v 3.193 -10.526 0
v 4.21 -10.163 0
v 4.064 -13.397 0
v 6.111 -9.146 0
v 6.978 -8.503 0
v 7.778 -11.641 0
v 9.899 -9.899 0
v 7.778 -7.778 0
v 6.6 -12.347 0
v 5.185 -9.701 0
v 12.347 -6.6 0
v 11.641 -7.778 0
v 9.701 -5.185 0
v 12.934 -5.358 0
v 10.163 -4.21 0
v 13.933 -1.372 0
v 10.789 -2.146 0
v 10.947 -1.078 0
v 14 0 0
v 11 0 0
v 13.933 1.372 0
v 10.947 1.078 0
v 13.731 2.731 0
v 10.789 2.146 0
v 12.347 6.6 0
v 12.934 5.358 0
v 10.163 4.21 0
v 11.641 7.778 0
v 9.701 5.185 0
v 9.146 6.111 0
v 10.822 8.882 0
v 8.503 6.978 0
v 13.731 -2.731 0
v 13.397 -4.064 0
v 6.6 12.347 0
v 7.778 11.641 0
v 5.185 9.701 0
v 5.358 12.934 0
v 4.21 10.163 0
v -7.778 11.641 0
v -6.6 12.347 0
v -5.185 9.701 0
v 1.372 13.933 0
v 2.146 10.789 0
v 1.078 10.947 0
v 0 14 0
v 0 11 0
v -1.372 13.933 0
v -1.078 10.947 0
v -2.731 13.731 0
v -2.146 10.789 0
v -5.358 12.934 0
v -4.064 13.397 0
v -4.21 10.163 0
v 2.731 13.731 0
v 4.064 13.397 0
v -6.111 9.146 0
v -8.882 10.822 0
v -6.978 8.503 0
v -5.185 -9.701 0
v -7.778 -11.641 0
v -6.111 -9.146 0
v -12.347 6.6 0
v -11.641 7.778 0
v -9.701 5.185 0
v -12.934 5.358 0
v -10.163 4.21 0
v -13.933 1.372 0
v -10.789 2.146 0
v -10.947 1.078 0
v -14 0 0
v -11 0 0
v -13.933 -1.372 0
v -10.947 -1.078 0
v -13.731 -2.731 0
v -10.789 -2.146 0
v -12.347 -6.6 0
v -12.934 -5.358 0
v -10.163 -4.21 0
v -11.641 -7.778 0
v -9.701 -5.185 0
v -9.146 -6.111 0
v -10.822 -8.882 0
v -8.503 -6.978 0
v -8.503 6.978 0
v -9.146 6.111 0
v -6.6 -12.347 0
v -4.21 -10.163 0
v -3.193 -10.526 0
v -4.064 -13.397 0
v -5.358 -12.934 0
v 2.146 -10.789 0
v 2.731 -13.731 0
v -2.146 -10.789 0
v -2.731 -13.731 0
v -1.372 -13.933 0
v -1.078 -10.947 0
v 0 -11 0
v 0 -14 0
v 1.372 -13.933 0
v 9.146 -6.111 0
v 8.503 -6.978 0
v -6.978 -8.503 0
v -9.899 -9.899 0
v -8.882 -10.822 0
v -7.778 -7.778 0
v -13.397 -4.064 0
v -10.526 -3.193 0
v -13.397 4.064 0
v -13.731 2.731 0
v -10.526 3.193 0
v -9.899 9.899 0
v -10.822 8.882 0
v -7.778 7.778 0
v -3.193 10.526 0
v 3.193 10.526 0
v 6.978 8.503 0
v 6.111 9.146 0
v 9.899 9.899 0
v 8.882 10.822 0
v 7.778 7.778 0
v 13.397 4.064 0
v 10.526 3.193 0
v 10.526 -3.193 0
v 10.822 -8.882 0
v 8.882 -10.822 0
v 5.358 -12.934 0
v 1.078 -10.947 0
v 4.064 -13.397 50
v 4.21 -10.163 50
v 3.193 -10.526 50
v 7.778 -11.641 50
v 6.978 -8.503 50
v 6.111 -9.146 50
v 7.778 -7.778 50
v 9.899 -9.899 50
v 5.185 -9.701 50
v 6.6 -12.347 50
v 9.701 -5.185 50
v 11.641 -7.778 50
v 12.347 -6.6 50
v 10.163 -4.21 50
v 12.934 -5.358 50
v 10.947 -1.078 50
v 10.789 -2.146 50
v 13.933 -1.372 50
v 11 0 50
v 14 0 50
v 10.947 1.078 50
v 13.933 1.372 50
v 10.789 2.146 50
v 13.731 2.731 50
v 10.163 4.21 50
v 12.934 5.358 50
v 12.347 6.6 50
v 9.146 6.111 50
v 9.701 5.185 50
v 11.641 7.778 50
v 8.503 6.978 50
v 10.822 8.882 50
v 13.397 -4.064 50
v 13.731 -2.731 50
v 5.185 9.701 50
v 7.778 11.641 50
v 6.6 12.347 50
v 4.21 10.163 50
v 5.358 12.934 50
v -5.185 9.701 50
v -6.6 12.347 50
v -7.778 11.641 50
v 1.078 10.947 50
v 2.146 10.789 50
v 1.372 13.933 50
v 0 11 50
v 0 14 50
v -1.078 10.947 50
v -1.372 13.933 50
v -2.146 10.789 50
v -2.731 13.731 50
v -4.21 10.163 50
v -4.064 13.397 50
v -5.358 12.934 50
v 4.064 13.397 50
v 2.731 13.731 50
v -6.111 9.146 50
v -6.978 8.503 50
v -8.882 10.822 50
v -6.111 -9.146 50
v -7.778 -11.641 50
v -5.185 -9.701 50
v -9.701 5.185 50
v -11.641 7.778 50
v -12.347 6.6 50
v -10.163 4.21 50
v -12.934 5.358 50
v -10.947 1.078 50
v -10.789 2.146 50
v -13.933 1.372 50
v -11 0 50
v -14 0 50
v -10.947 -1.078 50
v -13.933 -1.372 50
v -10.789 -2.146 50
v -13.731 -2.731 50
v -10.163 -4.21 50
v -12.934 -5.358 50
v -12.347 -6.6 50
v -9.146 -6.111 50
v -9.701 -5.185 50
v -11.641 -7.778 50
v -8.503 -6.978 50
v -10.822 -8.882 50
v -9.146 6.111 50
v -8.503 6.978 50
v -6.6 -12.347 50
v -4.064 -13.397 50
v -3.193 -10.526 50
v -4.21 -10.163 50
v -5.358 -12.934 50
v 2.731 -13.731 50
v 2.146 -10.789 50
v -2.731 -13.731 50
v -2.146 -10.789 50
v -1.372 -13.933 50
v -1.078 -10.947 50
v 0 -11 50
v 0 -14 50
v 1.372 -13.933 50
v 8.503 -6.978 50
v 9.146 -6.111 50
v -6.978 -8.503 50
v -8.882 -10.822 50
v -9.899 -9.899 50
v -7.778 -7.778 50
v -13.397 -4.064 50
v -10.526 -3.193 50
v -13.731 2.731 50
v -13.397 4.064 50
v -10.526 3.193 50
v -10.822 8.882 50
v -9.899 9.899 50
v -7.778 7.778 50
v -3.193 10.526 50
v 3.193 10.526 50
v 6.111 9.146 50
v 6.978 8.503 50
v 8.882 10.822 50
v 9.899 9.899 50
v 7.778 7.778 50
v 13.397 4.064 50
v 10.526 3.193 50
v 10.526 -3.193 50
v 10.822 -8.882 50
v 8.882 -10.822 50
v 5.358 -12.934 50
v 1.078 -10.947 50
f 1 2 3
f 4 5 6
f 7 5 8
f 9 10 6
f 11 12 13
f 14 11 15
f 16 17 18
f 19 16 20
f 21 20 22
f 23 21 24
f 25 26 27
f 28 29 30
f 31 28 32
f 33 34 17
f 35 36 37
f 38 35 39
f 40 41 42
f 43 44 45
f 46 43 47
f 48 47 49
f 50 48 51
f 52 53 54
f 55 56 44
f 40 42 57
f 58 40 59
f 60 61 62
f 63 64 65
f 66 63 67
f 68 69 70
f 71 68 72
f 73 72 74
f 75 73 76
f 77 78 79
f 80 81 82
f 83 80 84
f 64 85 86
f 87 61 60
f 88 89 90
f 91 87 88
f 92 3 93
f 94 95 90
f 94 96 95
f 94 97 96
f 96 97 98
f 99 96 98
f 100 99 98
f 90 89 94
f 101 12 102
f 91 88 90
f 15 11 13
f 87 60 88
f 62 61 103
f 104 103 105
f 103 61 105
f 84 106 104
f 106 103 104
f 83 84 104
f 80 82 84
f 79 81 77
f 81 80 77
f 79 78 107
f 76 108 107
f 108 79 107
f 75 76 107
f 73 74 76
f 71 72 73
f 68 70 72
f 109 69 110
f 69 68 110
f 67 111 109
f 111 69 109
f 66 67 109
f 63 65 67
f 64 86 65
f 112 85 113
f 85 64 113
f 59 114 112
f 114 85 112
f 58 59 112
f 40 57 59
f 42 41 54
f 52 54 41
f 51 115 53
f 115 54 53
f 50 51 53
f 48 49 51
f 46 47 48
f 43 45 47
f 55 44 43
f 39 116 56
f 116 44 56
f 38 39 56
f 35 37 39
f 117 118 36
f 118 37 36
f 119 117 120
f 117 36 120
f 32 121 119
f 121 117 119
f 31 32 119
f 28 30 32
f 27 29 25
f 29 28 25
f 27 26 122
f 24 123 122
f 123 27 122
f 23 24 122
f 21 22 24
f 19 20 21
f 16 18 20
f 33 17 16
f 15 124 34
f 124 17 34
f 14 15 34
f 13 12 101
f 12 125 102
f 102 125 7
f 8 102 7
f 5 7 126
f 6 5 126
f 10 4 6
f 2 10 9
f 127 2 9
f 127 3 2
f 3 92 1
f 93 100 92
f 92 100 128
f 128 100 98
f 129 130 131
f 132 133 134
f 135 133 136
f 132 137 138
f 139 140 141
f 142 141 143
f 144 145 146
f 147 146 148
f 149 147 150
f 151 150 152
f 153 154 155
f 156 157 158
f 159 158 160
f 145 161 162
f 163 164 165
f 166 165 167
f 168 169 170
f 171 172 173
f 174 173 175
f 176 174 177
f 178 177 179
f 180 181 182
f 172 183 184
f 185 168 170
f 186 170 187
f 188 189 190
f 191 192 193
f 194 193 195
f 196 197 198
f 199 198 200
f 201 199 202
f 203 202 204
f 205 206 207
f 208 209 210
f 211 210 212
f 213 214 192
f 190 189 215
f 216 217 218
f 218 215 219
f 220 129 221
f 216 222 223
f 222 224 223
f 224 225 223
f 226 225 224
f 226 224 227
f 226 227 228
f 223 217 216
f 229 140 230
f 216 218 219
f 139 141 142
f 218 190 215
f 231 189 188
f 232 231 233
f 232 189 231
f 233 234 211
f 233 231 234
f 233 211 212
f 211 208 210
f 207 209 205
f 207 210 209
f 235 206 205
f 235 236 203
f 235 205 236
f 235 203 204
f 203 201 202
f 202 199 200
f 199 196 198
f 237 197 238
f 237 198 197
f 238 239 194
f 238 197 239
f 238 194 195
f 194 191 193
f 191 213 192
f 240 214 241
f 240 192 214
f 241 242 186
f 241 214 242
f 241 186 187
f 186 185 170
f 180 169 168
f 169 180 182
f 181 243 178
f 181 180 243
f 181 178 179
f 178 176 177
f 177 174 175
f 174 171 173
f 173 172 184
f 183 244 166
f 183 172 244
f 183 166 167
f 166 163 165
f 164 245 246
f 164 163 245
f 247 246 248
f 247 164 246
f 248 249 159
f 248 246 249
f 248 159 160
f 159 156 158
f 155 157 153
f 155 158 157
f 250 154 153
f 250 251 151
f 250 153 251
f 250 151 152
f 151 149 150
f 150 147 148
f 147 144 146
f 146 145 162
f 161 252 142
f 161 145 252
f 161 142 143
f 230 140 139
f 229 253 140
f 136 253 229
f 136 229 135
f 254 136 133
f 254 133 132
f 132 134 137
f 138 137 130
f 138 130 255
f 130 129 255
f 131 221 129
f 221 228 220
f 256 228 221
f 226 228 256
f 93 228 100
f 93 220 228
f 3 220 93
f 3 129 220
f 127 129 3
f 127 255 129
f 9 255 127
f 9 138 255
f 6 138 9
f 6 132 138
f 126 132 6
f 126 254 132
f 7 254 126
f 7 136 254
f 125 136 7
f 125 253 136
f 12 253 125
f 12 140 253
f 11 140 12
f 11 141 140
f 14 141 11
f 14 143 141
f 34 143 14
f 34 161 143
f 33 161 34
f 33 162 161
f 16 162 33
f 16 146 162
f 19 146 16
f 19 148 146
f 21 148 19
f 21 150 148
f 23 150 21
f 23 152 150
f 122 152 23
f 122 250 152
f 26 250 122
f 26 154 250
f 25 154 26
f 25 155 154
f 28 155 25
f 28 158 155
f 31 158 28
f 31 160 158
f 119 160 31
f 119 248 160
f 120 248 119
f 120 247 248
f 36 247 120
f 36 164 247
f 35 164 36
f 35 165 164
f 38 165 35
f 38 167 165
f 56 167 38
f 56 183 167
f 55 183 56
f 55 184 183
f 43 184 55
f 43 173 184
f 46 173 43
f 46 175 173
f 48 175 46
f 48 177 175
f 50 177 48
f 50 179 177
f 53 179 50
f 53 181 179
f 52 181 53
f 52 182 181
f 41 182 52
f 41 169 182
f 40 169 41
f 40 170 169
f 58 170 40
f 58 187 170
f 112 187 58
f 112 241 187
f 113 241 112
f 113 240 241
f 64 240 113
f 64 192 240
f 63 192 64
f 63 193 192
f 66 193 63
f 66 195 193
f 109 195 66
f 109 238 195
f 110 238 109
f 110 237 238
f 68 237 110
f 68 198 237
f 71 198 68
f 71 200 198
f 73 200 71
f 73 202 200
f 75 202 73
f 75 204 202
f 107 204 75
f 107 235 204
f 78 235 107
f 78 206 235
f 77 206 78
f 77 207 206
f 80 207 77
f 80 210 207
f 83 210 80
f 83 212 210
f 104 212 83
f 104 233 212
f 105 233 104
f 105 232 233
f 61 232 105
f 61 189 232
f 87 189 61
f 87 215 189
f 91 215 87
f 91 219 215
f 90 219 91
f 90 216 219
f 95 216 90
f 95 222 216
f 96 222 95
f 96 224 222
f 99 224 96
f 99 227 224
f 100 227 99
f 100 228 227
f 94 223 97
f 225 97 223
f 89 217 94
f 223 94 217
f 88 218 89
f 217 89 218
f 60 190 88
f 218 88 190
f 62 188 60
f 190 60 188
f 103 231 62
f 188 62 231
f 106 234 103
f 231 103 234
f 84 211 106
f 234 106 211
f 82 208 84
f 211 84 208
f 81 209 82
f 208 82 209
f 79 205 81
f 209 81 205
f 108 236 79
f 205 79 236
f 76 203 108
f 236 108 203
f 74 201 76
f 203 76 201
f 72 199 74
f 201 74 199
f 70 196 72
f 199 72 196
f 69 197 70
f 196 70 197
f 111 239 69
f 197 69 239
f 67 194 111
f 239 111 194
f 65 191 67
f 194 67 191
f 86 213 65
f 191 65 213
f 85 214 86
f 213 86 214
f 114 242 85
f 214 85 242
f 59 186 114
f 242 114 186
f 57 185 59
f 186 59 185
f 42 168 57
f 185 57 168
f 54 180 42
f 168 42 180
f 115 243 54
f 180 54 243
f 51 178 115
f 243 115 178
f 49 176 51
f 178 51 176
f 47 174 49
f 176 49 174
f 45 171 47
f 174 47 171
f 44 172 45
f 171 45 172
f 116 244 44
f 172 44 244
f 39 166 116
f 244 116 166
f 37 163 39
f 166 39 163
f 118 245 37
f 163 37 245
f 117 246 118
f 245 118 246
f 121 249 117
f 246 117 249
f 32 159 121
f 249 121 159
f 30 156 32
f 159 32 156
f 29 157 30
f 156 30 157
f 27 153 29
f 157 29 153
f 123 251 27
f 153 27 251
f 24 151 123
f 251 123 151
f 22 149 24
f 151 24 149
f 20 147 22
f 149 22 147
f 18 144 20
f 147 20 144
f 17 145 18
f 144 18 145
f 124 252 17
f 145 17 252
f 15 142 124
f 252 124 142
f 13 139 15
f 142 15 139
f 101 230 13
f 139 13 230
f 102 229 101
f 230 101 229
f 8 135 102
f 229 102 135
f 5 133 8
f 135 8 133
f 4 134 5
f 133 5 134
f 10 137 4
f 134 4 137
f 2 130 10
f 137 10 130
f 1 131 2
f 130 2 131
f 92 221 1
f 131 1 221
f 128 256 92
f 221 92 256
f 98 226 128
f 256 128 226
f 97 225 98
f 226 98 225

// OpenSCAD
d=22;
thickness=2;
h=50;

res=64;

linear_extrude(50)
difference(){
  circle(d=d+thickness+2*thickness, $fn=res);
  circle(d=d, $fn=res);
}
